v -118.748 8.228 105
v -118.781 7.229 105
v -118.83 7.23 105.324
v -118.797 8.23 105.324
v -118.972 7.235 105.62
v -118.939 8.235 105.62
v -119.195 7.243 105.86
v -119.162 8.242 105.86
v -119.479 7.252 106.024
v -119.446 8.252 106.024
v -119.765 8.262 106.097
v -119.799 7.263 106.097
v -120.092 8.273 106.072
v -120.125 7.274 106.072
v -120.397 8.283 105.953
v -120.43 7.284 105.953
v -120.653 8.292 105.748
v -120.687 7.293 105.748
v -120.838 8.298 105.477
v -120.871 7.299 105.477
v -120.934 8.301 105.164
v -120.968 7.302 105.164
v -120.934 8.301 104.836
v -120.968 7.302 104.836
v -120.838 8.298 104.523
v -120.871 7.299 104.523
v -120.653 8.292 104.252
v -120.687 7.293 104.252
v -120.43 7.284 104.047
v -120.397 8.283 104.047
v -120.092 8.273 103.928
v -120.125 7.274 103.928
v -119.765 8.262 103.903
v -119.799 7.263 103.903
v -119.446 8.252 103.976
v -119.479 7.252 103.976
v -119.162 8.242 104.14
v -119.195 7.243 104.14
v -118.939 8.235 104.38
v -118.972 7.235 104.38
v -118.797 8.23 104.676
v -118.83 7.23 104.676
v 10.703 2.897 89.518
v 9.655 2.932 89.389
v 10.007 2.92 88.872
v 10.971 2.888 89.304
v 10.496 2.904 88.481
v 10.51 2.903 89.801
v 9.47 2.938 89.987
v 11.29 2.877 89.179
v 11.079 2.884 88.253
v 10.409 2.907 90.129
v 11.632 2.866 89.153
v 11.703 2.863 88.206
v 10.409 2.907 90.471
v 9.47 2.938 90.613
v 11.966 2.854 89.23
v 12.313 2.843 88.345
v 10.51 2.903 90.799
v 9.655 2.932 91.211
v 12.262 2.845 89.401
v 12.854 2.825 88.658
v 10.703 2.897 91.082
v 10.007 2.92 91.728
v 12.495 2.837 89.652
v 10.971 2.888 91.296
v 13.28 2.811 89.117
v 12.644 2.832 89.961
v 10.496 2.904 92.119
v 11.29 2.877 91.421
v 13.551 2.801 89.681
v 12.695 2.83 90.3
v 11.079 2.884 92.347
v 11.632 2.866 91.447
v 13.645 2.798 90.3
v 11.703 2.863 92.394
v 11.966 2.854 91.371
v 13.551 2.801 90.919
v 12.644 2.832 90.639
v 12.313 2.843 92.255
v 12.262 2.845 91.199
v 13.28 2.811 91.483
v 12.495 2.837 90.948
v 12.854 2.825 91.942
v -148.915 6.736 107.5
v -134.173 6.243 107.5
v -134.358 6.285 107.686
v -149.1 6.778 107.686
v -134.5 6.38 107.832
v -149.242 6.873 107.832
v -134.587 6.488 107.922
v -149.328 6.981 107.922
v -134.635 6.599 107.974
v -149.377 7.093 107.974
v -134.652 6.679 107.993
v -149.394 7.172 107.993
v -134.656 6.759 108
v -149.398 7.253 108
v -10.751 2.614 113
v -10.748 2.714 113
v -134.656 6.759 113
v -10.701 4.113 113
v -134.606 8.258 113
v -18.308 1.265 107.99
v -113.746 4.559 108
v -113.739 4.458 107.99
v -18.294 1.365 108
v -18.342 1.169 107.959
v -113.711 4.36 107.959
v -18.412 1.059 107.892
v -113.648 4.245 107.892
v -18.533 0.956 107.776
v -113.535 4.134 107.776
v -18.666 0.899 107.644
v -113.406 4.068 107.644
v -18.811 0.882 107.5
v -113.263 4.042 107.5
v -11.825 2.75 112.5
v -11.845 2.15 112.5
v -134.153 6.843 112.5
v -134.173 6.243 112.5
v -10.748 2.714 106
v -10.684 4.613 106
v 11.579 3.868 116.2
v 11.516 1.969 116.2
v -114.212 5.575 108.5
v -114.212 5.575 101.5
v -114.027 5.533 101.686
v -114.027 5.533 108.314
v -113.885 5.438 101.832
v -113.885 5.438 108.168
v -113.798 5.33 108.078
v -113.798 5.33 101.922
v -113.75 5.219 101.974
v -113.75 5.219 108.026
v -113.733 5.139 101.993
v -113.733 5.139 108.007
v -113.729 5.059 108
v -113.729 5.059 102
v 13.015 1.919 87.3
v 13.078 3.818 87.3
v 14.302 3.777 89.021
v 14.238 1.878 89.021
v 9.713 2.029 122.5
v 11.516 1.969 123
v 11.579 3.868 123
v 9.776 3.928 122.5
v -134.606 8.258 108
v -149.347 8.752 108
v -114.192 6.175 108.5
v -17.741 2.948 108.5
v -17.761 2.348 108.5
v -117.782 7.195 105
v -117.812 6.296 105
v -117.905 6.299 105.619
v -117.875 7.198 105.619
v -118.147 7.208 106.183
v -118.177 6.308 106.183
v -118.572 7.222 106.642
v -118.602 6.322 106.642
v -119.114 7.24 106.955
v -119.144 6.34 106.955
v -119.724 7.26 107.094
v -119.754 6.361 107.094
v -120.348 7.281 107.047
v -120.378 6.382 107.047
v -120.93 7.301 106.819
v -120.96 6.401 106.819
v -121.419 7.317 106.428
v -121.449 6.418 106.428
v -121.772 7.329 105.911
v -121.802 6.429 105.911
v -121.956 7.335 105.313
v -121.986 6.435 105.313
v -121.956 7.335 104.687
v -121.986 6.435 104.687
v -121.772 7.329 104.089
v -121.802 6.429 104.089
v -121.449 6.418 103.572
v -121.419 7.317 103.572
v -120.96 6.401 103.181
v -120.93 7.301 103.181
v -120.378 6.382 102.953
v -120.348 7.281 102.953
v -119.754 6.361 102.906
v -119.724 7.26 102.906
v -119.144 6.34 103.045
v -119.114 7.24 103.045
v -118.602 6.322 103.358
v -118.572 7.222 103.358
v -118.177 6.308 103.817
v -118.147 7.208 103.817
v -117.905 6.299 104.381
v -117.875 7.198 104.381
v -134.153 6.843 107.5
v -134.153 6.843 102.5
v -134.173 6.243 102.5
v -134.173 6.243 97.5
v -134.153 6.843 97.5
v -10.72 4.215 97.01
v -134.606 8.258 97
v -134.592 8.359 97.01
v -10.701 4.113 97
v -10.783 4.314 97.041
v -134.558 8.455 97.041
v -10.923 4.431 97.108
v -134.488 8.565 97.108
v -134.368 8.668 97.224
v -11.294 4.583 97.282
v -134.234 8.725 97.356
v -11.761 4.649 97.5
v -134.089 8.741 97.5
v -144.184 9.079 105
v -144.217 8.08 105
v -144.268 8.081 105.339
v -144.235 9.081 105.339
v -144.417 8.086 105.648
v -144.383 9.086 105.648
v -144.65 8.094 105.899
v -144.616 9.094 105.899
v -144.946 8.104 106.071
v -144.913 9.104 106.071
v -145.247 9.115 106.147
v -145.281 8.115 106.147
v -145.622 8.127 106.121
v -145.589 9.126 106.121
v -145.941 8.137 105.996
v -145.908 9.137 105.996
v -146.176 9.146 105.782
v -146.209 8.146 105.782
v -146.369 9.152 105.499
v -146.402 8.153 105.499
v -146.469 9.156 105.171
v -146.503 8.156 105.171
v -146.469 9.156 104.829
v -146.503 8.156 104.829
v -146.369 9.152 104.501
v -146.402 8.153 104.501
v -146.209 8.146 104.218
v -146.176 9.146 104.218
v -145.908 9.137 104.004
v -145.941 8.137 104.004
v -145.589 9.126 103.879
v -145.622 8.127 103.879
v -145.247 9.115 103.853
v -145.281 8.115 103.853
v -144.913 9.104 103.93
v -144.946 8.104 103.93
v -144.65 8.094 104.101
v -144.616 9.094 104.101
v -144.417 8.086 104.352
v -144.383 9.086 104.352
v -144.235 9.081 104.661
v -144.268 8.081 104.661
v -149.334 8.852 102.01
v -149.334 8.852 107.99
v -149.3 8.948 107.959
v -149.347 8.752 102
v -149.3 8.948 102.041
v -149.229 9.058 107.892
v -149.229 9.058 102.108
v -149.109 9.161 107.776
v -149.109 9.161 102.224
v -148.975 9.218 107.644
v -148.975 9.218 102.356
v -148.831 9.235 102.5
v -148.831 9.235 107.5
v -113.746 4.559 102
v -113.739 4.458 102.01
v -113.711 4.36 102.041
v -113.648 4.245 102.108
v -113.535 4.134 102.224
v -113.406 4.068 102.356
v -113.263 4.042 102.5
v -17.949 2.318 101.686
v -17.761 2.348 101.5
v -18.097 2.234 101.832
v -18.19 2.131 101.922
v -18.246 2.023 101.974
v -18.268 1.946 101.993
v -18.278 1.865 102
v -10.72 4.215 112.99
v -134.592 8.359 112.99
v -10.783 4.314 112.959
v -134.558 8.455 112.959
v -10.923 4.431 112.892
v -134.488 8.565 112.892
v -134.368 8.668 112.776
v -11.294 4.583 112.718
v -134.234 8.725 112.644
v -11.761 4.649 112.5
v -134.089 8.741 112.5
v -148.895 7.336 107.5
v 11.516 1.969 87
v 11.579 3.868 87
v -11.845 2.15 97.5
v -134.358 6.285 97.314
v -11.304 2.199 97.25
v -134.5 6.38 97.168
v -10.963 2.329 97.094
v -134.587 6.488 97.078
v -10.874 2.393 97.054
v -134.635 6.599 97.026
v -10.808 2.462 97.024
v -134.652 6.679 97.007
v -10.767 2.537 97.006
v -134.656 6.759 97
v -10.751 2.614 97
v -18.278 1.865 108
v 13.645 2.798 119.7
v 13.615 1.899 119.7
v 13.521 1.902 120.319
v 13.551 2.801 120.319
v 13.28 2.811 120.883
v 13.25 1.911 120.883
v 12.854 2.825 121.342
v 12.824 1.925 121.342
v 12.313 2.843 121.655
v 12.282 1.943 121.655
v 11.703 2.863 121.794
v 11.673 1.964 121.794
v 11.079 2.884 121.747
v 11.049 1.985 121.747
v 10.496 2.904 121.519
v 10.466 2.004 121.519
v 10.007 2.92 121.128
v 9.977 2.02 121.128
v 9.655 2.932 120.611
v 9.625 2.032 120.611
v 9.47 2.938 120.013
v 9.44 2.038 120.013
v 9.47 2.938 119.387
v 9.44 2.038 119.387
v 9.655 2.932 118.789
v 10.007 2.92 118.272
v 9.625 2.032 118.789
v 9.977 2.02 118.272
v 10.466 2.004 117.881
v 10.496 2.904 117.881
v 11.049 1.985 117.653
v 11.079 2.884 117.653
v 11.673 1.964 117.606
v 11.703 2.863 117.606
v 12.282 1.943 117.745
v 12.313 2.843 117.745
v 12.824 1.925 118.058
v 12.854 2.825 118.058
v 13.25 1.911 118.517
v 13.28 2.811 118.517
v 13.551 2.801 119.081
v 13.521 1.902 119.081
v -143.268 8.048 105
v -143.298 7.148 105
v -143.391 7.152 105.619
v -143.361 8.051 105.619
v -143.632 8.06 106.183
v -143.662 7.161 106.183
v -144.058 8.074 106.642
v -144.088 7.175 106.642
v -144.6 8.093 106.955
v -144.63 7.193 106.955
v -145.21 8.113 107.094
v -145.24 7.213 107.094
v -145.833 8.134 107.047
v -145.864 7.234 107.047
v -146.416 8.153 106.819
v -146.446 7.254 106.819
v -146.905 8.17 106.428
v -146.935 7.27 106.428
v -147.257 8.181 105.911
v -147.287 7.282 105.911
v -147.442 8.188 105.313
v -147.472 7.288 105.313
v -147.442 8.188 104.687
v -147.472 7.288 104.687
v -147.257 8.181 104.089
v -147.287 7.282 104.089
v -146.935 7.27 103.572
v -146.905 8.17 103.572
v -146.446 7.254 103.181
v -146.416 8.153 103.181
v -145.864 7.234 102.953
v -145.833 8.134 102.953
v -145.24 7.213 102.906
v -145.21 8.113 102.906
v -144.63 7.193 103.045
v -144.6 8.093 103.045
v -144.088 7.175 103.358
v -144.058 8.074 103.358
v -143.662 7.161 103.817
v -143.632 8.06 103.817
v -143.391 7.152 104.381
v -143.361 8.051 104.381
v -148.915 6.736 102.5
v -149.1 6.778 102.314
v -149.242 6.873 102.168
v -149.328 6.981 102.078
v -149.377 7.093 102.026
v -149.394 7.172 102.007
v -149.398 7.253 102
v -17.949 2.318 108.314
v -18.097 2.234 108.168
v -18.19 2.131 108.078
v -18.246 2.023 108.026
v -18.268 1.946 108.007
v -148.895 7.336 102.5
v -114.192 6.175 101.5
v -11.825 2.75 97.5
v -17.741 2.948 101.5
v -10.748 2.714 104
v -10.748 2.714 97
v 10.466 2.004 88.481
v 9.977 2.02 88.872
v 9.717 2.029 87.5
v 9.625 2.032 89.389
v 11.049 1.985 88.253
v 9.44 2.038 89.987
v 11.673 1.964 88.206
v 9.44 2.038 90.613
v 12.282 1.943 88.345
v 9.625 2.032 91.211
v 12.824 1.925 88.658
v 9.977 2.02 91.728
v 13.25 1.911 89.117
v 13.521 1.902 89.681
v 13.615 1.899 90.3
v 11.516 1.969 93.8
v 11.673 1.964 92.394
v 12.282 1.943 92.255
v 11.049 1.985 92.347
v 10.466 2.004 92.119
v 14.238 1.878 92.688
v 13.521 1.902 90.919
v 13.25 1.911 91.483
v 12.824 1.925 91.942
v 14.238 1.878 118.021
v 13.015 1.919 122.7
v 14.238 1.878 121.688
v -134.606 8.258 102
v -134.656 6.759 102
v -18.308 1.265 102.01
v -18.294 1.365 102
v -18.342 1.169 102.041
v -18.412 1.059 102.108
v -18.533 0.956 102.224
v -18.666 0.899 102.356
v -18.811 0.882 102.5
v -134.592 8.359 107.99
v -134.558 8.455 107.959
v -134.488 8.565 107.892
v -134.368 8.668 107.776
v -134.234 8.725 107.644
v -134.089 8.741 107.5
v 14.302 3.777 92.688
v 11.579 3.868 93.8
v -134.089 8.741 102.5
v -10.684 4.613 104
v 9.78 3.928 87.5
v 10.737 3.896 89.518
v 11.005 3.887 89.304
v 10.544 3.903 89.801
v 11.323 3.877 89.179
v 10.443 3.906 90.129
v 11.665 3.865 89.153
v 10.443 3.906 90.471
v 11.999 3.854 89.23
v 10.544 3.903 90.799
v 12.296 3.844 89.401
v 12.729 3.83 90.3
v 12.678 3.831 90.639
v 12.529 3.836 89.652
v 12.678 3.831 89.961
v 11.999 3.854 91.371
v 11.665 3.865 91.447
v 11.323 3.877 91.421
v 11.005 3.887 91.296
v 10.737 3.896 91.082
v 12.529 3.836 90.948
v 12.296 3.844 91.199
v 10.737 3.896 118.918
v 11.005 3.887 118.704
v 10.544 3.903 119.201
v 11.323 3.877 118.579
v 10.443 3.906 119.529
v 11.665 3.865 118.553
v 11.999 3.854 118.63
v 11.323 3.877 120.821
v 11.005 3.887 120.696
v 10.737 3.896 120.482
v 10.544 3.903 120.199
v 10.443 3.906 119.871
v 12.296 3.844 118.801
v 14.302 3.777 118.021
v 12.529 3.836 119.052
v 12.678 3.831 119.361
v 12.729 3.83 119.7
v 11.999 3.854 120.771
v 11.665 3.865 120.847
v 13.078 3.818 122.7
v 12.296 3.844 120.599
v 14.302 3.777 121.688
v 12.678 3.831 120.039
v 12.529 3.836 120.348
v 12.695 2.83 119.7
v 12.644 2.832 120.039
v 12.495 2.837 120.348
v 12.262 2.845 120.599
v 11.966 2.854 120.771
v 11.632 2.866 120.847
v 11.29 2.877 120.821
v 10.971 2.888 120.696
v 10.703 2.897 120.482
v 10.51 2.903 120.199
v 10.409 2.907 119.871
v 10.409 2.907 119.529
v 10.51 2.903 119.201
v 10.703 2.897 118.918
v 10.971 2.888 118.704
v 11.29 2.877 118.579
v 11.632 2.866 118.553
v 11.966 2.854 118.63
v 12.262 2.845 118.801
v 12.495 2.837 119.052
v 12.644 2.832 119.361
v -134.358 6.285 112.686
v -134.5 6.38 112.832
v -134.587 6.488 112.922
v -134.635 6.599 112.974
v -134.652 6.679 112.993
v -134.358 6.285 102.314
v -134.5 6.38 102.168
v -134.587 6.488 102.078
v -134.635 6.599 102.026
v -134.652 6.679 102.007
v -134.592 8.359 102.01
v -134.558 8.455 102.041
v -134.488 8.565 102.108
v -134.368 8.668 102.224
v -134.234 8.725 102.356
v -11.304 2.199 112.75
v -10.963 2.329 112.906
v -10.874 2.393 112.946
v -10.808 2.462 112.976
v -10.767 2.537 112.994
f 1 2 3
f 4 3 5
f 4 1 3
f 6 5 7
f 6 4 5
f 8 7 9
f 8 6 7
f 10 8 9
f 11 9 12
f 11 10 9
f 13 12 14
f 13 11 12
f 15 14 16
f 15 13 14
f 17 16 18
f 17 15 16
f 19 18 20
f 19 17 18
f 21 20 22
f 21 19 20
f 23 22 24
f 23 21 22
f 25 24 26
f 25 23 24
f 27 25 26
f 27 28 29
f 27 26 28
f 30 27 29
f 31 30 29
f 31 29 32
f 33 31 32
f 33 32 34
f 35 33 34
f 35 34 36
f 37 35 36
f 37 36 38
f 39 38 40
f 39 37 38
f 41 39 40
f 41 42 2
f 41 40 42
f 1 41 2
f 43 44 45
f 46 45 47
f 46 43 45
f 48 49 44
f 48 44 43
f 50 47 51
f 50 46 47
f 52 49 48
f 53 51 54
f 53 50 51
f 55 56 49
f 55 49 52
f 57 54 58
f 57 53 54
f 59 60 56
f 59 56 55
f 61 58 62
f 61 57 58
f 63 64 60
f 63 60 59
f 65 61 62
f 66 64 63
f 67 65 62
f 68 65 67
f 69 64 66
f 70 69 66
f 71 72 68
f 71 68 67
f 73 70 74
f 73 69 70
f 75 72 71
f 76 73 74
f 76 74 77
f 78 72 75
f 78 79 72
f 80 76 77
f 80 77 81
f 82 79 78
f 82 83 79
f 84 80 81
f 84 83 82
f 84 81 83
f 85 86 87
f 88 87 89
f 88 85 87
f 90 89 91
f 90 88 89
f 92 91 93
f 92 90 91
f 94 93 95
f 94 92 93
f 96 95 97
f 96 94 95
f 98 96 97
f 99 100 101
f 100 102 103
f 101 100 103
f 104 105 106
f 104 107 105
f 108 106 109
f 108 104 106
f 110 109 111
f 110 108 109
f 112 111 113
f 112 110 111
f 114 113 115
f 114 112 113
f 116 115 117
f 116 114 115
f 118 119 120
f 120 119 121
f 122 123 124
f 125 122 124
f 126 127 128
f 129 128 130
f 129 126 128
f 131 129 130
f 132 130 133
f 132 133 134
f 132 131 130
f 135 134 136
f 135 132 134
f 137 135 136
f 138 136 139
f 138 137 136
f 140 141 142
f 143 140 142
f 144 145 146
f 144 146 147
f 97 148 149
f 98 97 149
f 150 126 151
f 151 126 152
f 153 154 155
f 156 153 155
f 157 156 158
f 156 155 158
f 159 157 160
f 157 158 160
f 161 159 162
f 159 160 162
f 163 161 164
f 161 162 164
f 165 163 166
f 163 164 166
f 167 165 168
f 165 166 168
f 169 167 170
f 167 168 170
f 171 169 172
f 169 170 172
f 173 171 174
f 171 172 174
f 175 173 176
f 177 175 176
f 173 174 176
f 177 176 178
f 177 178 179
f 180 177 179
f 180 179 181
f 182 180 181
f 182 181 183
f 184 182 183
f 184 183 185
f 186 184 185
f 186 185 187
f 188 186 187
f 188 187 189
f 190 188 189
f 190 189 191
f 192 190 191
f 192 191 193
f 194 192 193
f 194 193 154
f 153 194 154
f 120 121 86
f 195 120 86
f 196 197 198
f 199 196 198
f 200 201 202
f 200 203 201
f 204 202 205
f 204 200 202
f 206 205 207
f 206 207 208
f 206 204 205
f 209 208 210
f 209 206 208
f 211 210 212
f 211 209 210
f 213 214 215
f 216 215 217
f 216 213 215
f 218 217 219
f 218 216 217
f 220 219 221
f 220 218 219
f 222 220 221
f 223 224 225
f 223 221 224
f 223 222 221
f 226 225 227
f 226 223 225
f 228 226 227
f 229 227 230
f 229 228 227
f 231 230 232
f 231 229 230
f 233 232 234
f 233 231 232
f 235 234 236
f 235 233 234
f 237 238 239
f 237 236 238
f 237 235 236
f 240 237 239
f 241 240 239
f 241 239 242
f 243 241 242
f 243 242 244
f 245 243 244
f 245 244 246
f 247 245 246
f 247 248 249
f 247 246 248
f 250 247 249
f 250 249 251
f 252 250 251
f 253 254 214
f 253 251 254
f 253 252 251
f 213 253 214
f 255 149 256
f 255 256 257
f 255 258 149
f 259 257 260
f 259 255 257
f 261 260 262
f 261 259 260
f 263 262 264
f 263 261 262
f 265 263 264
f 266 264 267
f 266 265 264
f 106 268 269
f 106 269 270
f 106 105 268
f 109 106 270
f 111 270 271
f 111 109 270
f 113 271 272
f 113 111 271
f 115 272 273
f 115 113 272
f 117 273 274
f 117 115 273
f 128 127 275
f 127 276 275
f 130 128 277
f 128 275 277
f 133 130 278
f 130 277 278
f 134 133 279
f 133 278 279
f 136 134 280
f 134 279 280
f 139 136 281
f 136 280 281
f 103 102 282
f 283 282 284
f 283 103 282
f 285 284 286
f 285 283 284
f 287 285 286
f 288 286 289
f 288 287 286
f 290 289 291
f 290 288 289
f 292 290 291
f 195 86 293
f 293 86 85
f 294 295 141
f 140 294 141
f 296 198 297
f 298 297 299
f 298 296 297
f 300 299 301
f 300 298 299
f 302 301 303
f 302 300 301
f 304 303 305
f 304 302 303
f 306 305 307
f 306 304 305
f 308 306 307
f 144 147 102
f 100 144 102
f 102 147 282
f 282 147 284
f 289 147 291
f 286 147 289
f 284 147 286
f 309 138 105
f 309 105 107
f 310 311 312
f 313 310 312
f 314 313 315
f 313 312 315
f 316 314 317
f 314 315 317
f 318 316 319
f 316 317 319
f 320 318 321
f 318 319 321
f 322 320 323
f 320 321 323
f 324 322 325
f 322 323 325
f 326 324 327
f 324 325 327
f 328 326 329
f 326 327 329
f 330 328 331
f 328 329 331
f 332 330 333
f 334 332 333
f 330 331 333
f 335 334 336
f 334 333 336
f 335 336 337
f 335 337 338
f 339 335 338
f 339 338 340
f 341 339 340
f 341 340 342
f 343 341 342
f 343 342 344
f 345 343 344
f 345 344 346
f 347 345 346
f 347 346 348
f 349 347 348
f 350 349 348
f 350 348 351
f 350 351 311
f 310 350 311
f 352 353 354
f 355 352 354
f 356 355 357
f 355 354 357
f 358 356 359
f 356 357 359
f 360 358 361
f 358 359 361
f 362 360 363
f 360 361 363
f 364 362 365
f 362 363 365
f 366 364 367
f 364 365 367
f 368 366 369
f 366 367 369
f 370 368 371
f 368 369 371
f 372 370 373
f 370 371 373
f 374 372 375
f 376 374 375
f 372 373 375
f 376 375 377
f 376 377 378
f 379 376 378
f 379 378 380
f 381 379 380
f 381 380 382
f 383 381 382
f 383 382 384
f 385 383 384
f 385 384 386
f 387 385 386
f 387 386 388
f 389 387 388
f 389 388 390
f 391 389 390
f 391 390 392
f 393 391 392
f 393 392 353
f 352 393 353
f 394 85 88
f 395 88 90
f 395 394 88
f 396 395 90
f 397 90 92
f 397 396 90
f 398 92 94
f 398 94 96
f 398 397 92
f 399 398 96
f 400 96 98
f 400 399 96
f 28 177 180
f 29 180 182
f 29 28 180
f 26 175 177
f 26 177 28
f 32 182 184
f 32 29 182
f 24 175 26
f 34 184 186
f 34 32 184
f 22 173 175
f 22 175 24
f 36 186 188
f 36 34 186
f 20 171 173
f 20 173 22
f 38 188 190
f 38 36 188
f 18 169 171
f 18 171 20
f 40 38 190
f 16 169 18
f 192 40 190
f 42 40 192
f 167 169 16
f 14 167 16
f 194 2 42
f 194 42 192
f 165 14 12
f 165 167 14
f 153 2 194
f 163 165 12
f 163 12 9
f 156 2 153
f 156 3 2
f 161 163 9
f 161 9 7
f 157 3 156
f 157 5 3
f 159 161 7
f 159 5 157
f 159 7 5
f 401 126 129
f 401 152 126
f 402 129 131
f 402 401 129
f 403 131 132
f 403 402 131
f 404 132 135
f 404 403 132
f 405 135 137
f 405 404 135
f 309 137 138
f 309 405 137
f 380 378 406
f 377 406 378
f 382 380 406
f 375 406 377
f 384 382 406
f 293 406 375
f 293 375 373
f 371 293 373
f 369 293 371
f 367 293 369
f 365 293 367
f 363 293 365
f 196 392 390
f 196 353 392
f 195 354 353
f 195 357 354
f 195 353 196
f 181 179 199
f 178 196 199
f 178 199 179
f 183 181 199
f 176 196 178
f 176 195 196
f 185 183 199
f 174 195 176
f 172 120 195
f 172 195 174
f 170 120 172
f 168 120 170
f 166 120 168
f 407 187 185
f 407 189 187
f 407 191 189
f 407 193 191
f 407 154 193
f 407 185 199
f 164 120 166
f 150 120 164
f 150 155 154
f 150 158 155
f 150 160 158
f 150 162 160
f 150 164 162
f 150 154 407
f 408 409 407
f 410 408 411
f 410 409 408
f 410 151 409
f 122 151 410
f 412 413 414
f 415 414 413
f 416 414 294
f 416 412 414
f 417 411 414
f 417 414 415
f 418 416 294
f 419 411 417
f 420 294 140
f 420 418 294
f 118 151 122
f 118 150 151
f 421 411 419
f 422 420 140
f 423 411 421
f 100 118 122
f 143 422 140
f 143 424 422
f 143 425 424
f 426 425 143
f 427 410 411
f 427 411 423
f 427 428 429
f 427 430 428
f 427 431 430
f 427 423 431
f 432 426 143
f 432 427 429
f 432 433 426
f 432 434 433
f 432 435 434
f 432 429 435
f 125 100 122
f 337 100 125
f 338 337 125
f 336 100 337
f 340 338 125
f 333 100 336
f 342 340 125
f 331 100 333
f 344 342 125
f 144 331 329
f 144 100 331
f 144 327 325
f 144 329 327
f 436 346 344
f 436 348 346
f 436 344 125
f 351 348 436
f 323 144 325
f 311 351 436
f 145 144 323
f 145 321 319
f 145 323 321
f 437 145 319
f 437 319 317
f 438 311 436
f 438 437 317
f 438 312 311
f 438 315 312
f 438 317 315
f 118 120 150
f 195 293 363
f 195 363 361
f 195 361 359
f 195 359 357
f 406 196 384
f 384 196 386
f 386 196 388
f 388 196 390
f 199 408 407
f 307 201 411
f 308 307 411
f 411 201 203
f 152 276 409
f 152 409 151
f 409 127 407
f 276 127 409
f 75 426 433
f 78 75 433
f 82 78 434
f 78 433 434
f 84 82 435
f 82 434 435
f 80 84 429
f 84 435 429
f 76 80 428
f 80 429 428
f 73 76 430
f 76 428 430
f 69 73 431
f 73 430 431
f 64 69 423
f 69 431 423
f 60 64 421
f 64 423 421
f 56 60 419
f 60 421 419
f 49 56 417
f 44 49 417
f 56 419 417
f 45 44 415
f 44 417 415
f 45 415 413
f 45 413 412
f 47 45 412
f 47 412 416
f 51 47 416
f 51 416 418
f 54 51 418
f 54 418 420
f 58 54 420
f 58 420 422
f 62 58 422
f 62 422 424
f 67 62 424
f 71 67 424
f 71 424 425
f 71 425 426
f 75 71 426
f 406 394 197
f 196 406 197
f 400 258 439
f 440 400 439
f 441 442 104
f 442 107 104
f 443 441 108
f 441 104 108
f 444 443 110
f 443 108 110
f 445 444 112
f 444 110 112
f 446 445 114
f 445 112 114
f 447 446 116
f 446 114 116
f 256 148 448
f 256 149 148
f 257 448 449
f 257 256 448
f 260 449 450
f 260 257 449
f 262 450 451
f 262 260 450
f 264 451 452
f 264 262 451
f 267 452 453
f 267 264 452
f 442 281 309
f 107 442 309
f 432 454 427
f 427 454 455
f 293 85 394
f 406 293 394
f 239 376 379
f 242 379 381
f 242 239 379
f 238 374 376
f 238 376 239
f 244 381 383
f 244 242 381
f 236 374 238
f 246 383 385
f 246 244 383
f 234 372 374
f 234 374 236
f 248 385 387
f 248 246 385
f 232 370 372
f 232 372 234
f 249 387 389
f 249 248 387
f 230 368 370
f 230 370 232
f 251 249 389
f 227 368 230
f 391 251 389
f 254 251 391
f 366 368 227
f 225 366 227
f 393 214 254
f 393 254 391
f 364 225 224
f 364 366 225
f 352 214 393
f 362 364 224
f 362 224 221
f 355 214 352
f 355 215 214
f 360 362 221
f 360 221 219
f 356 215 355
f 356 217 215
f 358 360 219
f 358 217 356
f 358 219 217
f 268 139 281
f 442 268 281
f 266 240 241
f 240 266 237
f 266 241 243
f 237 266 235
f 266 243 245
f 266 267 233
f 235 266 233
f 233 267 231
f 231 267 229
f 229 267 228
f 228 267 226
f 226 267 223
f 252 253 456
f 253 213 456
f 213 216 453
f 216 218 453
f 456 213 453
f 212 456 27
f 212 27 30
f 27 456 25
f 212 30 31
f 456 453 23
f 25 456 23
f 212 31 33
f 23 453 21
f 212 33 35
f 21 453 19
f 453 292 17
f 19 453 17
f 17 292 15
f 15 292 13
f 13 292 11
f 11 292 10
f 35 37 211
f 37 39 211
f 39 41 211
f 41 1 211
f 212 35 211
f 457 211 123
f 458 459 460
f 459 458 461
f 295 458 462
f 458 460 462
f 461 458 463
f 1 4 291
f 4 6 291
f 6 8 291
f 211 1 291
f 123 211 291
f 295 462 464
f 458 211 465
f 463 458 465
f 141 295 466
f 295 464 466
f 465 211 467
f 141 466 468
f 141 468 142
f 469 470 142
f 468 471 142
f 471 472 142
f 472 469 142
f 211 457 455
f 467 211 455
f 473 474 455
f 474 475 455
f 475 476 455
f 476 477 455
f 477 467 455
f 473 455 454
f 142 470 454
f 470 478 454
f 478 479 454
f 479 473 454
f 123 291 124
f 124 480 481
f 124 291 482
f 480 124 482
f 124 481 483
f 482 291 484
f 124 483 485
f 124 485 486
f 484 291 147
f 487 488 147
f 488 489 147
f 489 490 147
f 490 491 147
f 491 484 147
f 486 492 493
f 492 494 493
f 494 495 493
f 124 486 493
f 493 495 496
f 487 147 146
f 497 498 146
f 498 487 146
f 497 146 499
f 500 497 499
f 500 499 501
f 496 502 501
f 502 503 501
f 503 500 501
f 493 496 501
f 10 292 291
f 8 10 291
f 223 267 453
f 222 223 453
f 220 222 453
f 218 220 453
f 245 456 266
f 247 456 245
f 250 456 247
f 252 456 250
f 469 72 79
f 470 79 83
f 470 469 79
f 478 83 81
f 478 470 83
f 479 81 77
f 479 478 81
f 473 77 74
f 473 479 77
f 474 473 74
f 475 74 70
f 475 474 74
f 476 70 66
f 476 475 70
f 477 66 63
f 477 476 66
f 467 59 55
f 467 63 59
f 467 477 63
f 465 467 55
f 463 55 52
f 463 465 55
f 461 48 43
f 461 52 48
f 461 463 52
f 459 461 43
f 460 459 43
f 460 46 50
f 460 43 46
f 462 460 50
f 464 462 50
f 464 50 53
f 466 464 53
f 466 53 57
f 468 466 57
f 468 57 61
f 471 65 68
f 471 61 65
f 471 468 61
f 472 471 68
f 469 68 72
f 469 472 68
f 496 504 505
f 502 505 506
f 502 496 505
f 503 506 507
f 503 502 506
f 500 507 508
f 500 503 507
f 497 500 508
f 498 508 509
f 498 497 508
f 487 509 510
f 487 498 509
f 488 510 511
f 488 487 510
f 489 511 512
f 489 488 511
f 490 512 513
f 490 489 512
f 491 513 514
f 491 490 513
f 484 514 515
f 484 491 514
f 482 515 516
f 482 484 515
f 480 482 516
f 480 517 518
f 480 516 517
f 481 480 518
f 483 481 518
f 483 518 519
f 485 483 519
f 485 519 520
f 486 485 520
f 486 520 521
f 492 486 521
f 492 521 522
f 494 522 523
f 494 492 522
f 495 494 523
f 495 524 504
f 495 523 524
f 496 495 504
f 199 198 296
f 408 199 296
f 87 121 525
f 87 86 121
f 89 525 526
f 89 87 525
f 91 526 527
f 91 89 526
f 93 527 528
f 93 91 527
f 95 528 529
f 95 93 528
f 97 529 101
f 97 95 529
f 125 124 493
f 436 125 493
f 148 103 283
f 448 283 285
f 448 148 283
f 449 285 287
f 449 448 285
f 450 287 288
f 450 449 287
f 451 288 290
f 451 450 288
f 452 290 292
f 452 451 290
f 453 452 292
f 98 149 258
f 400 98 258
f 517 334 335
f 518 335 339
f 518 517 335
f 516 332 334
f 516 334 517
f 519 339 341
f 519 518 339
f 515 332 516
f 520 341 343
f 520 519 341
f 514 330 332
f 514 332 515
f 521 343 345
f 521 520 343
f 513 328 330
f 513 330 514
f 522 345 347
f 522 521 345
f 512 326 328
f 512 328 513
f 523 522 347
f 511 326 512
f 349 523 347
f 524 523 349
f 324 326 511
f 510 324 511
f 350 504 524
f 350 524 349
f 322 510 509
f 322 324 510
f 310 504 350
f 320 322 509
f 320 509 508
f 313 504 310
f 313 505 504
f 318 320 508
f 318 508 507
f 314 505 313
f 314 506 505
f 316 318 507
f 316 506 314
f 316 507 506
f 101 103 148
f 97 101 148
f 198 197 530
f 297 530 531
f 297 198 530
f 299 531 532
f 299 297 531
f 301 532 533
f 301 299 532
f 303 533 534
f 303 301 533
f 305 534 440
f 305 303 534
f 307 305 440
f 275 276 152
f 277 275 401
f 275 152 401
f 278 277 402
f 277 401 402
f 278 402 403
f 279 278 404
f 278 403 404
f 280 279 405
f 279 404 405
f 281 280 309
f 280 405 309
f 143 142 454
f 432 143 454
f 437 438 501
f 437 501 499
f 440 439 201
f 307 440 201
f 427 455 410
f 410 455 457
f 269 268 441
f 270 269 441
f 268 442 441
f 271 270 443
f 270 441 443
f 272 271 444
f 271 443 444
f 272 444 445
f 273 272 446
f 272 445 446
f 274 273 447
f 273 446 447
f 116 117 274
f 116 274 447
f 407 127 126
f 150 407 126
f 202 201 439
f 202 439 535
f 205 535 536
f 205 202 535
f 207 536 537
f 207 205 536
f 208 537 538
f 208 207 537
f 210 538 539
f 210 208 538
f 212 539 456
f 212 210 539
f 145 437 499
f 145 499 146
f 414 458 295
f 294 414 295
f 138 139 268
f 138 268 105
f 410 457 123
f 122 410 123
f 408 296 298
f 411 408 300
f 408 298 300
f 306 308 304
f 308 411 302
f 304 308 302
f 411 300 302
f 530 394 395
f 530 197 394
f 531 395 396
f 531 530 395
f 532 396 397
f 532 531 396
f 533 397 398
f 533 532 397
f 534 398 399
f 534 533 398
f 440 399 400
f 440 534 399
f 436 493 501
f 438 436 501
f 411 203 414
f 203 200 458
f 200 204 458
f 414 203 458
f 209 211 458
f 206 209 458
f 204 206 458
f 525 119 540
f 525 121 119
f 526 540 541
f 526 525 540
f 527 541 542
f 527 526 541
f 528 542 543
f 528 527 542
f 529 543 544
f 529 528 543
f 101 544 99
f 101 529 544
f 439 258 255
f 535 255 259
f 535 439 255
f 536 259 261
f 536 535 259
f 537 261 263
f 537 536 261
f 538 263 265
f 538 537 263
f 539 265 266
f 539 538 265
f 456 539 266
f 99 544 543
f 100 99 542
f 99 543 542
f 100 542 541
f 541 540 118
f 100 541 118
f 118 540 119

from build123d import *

# Parameters (mm, degrees)
SKETCH1_R           = 1.15
SKETCH1_R_2         = 1.1
BOSS_EXTRUDE1_DEPTH = 2.5
SKETCH2_R           = 2.1
CUT_EXTRUDE1_DEPTH  = 1.5
SKETCH3_W           = 95.504738846
SKETCH3_H           = 6
BOSS_EXTRUDE2_DEPTH = 1.5
FILLET1_R           = 0.5
FILLET2_R           = 0.5
SKETCH4_R           = 2.1
SKETCH4_W           = 96.504738846
SKETCH4_H           = 7
CUT_EXTRUDE2_DEPTH  = 0.6


with BuildPart() as part:
    # Sketch1 → Boss-Extrude1 (new body)
    with BuildSketch(Plane(origin=(0.142209029, 4.250598455, 0), x_dir=(0.999440809, -0.033437529, 0), z_dir=(-0.033437529, -0.999440809, 0))):
        Polygon((11.443429389, 116.200036636), (14.167398509, 118.020989552), (14.167398349, 121.688114552), (12.943429389, 122.700036636), (11.443429389, 123.000036636), (9.639575481, 122.500036636), (-10.832601571, 113.00003089), (-134.806739216, 113.00003089), (-134.806739216, 108.000029776), (-149.556569968, 108.000029776), (-149.556569968, 102.000029776), (-134.806740003, 102.000029776), (-134.806740003, 97.00003089), (-10.832601571, 97.00003089), (9.643430674, 87.500036636), (11.443430674, 87.000036636), (12.943429388, 87.300036636), (14.167399777, 89.020989552), (14.167399616, 92.688114552), (11.443430674, 93.800036636), (-10.832601571, 104.00003089), (-10.832601571, 106.00003089), align=None)
        with Locations((11.443429389, 119.700036636)):
            Circle(SKETCH1_R, mode=Mode.SUBTRACT)
        with Locations((11.443430674, 90.300036636)):
            Circle(SKETCH1_R, mode=Mode.SUBTRACT)
        with Locations((-145.556569968, 105.000029776)):
            Circle(SKETCH1_R, mode=Mode.SUBTRACT)
        with Locations((-120.056569968, 105.00003089)):
            Circle(SKETCH1_R_2, mode=Mode.SUBTRACT)
    extrude(amount=BOSS_EXTRUDE1_DEPTH)

    # Sketch2 → Cut-Extrude1 (cut)
    with BuildSketch(Plane(origin=(0.058615208, 1.751996431, 0), x_dir=(0.999440809, -0.033437529, 0), z_dir=(-0.033437529, -0.999440809, 0))):
        with Locations((-145.556569968, 105.000029776)):
            Circle(SKETCH2_R)
        with Locations((-120.056569968, 105.00003089)):
            Circle(SKETCH2_R)
        with Locations((11.443429389, 119.700036636)):
            Circle(SKETCH2_R)
        with Locations((11.443430674, 90.300036636)):
            Circle(SKETCH2_R)
    extrude(amount=-CUT_EXTRUDE1_DEPTH, mode=Mode.SUBTRACT)

    # Sketch3 → Boss-Extrude2 (add)
    with BuildSketch(Plane(origin=(0.058615208, 1.751996431, 0), x_dir=(0.999440809, -0.033437529, 0), z_dir=(-0.033437529, -0.999440809, 0))):
        with Locations((-66.082119318, 105.00003089)):
            Rectangle(SKETCH3_W, SKETCH3_H)
    extrude(amount=BOSS_EXTRUDE2_DEPTH)

    # Fillet1
    fillet1_edges = [part.edges().sort_by_distance(p)[0] for p in [
        (-113.712218368, 5.558340404, 105.00003089),
        (-65.986551616, 3.961619186, 102.00003089),
        (-18.260884865, 2.364897967, 105.00003089),
        (-65.986551616, 3.961619186, 108.00003089),
        (-113.762374661, 4.05917919, 105.00003089),
        (-66.036707909, 2.462457971, 102.00003089),
        (-18.311041158, 0.865736753, 105.00003089),
        (-66.036707909, 2.462457971, 108.00003089),
    ]]
    fillet(fillet1_edges, radius=FILLET1_R)

    # Fillet2
    fillet2_edges = [part.edges().sort_by_distance(p)[0] for p in [
        (-72.636741689, 6.685508279, 97.00003089),
        (-134.589148324, 8.758202679, 99.500030333),
        (-141.959939325, 9.00480161, 102.000029776),
        (-149.330730325, 9.25140054, 105.000029776),
        (-141.959938931, 9.004801596, 108.000029776),
        (-134.589147538, 8.758202653, 110.500030333),
        (-72.636741296, 6.685508266, 113.00003089),
        (-72.720335117, 4.186906242, 113.00003089),
        (-134.672741359, 6.259600629, 110.500030333),
        (-142.043532753, 6.506199573, 108.000029776),
        (-149.414324146, 6.752798517, 105.000029776),
        (-142.043533146, 6.506199586, 102.000029776),
        (-134.672742146, 6.259600655, 99.500030333),
        (-72.72033551, 4.186906256, 97.00003089),
    ]]
    fillet(fillet2_edges, radius=FILLET2_R)

    # Sketch4 → Cut-Extrude2 (cut)
    with BuildSketch(Plane(origin=(0.058615208, 1.751996431, 0), x_dir=(0.999440809, -0.033437529, 0), z_dir=(-0.033437529, -0.999440809, 0))):
        Polygon((11.443429389, 116.200036636), (14.167398509, 118.020989552), (14.167398349, 121.688114552), (12.943429389, 122.700036636), (11.443429389, 123.000036636), (9.639575481, 122.500036636), (-10.832601571, 113.00003089), (-11.910083922, 112.50003089), (-134.306739216, 112.50003089), (-134.306739216, 107.500029776), (-149.056569968, 107.500029776), (-149.056569968, 102.500029776), (-134.306740003, 102.500029776), (-134.306740003, 97.50003089), (-11.91028813, 97.50003089), (-10.832601571, 97.00003089), (9.643430674, 87.500036636), (11.443430674, 87.000036636), (12.943429388, 87.300036636), (14.167399777, 89.020989552), (14.167399616, 92.688114552), (11.443430674, 93.800036636), (-10.832601571, 104.00003089), (-10.832601571, 106.00003089), align=None)
        with Locations((11.443430674, 90.300036636)):
            Circle(SKETCH4_R, mode=Mode.SUBTRACT)
        with Locations((-145.556569968, 105.000029776)):
            Circle(SKETCH4_R, mode=Mode.SUBTRACT)
        with Locations((-120.056569968, 105.00003089)):
            Circle(SKETCH4_R, mode=Mode.SUBTRACT)
        with Locations((-66.082119318, 105.00003089)):
            Rectangle(SKETCH4_W, SKETCH4_H, mode=Mode.SUBTRACT)
        with Locations((11.443429389, 119.700036636)):
            Circle(SKETCH4_R, mode=Mode.SUBTRACT)
    extrude(amount=-CUT_EXTRUDE2_DEPTH, mode=Mode.SUBTRACT)


solid = part.part
